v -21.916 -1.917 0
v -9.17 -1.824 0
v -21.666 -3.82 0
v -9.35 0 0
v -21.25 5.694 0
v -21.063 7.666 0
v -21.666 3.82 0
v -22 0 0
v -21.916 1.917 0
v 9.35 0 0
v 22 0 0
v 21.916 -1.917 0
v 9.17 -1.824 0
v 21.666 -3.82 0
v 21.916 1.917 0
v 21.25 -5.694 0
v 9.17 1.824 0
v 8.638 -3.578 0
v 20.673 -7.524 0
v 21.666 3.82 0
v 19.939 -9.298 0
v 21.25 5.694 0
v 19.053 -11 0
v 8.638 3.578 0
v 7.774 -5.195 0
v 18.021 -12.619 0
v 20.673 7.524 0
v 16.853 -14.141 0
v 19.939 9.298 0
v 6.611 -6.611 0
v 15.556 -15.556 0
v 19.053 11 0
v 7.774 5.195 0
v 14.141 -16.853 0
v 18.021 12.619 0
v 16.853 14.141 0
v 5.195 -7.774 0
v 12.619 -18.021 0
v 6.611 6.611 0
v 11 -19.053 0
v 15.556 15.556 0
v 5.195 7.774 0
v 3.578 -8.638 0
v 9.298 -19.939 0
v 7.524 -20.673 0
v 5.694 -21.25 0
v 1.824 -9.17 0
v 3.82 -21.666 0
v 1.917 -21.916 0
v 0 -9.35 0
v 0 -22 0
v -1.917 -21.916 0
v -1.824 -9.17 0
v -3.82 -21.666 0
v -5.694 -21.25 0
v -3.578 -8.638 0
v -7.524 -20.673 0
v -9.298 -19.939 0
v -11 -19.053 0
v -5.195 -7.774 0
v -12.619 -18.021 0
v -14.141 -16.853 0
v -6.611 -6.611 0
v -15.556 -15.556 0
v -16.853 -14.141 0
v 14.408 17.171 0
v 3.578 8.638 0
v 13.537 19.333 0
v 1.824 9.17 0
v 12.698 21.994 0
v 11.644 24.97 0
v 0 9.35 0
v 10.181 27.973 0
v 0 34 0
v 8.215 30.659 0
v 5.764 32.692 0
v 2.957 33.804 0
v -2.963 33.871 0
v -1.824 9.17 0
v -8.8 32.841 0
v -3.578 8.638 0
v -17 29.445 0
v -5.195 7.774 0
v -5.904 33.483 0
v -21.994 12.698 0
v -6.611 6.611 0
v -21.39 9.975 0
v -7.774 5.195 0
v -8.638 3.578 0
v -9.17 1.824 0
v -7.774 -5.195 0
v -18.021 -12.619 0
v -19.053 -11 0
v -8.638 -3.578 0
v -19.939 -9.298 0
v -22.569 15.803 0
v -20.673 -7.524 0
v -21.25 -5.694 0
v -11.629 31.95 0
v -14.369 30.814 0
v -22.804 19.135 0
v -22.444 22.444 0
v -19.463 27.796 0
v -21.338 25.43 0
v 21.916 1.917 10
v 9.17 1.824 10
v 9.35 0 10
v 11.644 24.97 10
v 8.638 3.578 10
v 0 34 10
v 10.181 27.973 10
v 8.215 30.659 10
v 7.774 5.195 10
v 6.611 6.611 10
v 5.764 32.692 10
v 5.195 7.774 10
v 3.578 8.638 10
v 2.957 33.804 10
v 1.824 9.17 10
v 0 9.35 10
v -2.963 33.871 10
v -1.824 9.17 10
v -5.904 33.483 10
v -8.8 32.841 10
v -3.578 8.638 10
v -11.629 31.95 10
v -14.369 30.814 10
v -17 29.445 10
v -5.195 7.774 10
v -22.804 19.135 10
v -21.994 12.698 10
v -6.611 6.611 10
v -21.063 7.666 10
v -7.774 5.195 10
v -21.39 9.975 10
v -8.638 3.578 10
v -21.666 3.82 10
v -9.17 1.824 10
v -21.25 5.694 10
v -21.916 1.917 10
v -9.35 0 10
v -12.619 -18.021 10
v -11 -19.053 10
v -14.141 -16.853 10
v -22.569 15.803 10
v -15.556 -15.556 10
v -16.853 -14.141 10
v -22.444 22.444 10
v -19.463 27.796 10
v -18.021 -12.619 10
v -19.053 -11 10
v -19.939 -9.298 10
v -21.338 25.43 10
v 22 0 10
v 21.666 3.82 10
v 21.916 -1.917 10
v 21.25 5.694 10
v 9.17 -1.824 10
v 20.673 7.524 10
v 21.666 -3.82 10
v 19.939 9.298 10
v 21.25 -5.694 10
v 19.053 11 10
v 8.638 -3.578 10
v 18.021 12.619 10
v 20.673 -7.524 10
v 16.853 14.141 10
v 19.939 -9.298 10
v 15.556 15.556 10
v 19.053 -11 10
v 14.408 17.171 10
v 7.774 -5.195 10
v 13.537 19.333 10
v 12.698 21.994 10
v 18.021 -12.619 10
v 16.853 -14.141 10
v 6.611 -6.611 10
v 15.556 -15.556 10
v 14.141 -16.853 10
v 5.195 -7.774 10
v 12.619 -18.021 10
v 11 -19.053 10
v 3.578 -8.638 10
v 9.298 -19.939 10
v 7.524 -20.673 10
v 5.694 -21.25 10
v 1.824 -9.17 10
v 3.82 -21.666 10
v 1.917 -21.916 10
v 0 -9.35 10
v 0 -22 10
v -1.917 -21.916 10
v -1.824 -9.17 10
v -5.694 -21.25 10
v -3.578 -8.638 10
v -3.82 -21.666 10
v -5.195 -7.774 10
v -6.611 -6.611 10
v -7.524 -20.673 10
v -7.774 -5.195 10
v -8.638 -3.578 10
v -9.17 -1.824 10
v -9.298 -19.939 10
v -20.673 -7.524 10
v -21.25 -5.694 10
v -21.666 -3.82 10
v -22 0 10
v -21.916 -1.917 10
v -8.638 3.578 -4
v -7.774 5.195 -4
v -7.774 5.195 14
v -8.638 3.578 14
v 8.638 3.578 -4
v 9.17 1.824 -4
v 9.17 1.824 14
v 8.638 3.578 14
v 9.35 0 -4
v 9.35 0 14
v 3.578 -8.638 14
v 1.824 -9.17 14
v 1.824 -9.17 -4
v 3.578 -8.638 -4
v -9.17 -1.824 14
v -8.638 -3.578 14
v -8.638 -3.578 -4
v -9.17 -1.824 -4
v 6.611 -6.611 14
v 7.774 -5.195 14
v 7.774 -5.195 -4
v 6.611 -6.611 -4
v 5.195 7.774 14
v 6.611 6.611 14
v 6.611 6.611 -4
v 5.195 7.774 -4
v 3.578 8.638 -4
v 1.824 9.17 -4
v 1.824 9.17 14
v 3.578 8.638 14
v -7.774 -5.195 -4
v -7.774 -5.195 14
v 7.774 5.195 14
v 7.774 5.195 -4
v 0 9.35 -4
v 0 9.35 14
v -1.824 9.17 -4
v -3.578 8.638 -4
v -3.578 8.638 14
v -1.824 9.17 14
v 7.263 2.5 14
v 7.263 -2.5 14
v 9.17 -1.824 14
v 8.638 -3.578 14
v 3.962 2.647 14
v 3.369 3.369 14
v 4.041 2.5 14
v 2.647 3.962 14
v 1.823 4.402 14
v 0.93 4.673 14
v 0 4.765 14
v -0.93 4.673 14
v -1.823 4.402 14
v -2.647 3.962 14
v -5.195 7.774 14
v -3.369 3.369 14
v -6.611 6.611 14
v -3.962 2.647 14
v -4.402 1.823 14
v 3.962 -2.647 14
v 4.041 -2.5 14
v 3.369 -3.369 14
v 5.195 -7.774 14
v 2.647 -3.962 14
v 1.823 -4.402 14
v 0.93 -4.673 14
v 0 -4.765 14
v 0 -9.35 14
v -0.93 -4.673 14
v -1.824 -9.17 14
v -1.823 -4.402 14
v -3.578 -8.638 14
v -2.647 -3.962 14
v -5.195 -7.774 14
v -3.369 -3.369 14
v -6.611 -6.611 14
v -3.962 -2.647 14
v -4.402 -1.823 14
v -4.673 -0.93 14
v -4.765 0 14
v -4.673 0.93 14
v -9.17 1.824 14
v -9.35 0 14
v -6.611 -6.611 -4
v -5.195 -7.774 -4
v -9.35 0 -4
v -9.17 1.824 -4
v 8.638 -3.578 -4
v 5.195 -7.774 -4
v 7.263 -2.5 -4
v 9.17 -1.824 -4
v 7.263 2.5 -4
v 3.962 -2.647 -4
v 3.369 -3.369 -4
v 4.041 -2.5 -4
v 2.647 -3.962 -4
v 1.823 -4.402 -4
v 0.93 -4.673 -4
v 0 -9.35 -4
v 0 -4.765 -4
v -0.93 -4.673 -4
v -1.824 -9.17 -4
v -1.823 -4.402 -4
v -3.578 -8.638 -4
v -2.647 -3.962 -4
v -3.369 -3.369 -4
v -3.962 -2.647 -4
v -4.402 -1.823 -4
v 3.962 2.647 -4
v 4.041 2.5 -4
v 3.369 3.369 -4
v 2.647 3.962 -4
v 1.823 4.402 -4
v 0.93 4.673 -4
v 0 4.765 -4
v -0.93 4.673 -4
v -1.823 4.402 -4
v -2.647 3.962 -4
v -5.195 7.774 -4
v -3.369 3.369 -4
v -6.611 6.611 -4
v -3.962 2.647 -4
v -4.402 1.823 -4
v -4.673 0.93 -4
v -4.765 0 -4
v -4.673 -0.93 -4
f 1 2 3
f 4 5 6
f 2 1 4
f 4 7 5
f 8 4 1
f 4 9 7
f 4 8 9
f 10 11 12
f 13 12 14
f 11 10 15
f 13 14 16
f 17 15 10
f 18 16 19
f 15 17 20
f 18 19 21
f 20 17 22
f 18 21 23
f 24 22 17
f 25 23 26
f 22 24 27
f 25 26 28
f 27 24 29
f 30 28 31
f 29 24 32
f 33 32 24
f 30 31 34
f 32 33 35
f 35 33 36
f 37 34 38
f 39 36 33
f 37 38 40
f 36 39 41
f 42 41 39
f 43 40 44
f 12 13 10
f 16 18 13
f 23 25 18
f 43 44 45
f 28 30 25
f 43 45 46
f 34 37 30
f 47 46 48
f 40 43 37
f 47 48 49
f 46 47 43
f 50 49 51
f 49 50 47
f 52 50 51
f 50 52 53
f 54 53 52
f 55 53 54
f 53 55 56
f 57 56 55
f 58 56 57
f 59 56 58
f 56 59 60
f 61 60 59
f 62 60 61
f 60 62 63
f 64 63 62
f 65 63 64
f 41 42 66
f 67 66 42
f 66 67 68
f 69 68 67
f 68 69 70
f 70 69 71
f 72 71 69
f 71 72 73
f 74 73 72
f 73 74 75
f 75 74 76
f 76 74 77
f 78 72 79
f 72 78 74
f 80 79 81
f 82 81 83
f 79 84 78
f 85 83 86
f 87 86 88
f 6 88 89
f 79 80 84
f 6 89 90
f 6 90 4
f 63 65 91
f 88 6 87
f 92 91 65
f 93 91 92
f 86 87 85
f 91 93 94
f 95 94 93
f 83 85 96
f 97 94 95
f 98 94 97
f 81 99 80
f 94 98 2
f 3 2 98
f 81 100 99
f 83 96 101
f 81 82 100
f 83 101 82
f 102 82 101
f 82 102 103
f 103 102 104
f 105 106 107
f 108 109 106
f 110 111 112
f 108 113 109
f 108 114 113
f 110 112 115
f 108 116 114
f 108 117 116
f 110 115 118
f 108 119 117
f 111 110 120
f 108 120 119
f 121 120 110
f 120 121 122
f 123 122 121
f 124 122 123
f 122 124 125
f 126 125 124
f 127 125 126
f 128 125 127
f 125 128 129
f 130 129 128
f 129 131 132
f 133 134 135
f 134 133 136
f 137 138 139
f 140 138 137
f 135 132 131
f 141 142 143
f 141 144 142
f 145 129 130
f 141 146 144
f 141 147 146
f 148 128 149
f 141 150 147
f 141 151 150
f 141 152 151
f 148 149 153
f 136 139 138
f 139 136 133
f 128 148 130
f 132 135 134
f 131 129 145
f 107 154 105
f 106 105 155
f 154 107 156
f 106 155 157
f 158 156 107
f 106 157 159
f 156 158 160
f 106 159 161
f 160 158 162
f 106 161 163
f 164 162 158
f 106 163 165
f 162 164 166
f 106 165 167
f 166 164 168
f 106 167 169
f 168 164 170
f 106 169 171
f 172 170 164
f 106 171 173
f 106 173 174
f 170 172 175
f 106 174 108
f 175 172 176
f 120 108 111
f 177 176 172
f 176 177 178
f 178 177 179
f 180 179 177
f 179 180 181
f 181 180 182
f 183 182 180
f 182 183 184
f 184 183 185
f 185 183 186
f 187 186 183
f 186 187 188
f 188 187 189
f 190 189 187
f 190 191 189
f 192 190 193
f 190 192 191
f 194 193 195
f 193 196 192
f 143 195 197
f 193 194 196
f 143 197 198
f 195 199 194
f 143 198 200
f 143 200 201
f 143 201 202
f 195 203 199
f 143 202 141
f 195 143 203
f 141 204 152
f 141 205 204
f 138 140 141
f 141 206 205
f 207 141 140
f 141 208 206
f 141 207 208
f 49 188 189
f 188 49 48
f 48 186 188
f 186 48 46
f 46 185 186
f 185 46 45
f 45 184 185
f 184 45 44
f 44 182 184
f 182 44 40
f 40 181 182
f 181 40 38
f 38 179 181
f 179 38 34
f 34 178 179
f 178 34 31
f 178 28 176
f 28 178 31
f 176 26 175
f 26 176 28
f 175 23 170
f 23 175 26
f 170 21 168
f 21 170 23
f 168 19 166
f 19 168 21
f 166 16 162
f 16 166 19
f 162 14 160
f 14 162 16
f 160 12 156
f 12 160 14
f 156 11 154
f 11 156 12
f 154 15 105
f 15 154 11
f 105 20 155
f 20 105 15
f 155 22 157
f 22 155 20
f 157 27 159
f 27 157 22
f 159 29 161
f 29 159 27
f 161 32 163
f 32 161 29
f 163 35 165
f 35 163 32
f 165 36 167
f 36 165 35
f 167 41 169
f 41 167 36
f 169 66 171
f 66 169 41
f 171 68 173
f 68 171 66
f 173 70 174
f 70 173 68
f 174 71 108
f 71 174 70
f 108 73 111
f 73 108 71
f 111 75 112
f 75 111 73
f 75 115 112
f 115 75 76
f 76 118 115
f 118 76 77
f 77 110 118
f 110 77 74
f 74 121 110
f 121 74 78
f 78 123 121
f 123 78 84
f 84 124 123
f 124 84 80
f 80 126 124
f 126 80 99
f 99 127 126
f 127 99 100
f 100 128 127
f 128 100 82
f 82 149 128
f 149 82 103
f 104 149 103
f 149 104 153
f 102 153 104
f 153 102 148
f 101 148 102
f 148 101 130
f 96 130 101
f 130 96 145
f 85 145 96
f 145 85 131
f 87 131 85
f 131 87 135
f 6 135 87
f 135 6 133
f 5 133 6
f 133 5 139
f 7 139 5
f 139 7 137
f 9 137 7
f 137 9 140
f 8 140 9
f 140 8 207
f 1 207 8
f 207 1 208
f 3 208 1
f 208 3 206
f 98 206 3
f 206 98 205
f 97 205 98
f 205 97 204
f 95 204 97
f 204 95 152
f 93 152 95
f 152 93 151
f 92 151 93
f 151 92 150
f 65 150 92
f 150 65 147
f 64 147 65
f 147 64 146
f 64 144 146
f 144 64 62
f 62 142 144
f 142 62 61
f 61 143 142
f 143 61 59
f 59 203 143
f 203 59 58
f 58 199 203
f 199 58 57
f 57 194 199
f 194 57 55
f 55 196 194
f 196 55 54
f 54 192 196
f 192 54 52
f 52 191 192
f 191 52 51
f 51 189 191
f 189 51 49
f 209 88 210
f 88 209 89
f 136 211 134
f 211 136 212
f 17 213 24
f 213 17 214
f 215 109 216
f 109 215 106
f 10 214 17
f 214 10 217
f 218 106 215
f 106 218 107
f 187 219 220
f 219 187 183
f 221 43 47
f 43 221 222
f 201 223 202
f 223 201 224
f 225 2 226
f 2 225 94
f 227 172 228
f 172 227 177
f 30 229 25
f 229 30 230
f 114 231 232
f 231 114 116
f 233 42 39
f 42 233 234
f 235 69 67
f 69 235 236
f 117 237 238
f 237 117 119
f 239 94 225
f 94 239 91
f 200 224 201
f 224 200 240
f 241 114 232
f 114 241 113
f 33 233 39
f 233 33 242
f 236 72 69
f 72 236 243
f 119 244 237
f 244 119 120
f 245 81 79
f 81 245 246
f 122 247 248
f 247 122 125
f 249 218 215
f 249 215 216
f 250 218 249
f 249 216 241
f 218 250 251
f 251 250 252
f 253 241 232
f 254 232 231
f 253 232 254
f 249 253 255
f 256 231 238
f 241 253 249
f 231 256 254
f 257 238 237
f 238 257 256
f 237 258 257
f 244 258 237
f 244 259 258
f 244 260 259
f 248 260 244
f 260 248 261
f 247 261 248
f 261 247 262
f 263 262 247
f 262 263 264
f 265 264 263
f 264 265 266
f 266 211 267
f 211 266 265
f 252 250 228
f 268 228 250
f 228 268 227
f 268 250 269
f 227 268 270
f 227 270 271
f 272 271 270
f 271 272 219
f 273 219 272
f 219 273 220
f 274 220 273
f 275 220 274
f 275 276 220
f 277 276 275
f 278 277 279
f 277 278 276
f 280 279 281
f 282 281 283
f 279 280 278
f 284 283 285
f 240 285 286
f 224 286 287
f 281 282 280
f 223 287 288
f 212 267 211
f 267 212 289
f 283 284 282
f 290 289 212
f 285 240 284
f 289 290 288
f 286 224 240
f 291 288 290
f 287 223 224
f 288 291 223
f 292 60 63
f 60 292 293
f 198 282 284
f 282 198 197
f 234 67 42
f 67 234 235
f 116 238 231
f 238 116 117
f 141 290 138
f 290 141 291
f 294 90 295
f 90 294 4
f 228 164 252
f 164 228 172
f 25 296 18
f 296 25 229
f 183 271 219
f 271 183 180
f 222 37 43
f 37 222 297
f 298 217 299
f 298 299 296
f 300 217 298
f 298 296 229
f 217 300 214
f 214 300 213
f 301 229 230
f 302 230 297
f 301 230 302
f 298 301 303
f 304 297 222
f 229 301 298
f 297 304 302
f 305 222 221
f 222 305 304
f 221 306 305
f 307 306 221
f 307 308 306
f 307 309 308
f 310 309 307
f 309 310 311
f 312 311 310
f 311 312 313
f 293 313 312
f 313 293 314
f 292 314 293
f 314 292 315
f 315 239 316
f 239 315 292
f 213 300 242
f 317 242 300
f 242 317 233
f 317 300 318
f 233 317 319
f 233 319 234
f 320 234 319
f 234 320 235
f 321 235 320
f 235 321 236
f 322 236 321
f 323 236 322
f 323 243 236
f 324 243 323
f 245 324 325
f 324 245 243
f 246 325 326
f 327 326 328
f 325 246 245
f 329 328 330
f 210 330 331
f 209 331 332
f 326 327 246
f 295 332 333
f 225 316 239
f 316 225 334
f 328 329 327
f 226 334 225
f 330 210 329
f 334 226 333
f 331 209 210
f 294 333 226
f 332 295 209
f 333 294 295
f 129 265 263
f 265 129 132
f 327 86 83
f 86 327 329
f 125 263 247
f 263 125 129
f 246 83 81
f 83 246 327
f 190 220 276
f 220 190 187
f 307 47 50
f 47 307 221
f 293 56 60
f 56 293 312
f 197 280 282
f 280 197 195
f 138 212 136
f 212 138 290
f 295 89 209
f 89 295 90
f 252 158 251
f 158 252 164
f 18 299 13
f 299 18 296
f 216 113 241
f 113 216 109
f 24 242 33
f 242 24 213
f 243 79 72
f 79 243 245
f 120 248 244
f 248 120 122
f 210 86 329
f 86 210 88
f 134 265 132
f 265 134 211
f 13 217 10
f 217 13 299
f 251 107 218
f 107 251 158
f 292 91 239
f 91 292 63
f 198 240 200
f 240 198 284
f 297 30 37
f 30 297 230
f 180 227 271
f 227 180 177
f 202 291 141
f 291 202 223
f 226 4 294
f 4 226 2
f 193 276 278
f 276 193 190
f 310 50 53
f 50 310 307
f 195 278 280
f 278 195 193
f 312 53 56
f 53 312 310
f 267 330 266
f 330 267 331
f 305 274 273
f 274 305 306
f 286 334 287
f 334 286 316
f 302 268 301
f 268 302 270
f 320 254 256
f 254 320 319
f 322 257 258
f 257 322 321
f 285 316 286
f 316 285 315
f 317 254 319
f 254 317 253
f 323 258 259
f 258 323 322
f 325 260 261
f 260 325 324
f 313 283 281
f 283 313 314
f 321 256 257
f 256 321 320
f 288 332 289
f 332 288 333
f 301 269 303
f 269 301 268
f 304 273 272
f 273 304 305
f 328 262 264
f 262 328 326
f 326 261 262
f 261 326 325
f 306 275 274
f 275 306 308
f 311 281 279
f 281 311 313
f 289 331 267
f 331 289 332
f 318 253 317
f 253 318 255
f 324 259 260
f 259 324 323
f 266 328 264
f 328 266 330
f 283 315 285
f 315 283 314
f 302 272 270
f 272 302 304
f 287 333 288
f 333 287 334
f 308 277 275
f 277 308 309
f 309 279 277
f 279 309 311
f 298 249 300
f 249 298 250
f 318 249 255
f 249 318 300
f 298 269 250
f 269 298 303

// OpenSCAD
$fn = 32;

// ----------------------------------------------------------------------
// Cam: base radius 22 mm with a 12 mm lift over 120 degrees
// ----------------------------------------------------------------------

// --- parameters (mm) ---
base_r = 22;              // base radius
lift = 12;                // lift height above the base radius
lift_span = 120;          // angular width of the lift
lift_start = 45;          // angle where the lift starts
cam_t = 10;               // cam plate thickness
hub_d = 18.7;             // hub diameter
hub_h = 18;               // hub height
bore_d = 9.53;            // bore
key_w = 5;                // keyway width
key_depth = 2.5;          // keyway depth

cam_profile = [[22, 0], [21.916, 1.917], [21.666, 3.82], [21.25, 5.694], [20.673, 7.524], [19.939, 9.298], [19.053, 11], [18.021, 12.619], [16.853, 14.141], [15.556, 15.556], [14.408, 17.171], [13.537, 19.333], [12.698, 21.994], [11.644, 24.97], [10.181, 27.973], [8.215, 30.659], [5.764, 32.692], [2.957, 33.804], [0, 34], [-2.963, 33.871], [-5.904, 33.483], [-8.8, 32.841], [-11.629, 31.95], [-14.369, 30.814], [-17, 29.445], [-19.463, 27.796], [-21.338, 25.43], [-22.444, 22.444], [-22.804, 19.135], [-22.569, 15.803], [-21.994, 12.698], [-21.39, 9.975], [-21.063, 7.666], [-21.25, 5.694], [-21.666, 3.82], [-21.916, 1.917], [-22, 0], [-21.916, -1.917], [-21.666, -3.82], [-21.25, -5.694], [-20.673, -7.524], [-19.939, -9.298], [-19.053, -11], [-18.021, -12.619], [-16.853, -14.141], [-15.556, -15.556], [-14.141, -16.853], [-12.619, -18.021], [-11, -19.053], [-9.298, -19.939], [-7.524, -20.673], [-5.694, -21.25], [-3.82, -21.666], [-1.917, -21.916], [0, -22], [1.917, -21.916], [3.82, -21.666], [5.694, -21.25], [7.524, -20.673], [9.298, -19.939], [11, -19.053], [12.619, -18.021], [14.141, -16.853], [15.556, -15.556], [16.853, -14.141], [18.021, -12.619], [19.053, -11], [19.939, -9.298], [20.673, -7.524], [21.25, -5.694], [21.666, -3.82], [21.916, -1.917]];

difference() {
  union() {
    linear_extrude(height = cam_t) polygon(cam_profile);
    /* hub, proud of the cam plate on both sides */
    translate([0, 0, -4]) cylinder(h = hub_h, d = hub_d);
  }
  /* bore through the hub, 2.5 mm clear on both faces */
  translate([0, 0, -6.5]) cylinder(h = hub_h + 5, d = bore_d);
  /* keyway, milled through the whole hub */
  translate([2.263, -2.5, -6.5]) cube([5, 5, 23]);
}
